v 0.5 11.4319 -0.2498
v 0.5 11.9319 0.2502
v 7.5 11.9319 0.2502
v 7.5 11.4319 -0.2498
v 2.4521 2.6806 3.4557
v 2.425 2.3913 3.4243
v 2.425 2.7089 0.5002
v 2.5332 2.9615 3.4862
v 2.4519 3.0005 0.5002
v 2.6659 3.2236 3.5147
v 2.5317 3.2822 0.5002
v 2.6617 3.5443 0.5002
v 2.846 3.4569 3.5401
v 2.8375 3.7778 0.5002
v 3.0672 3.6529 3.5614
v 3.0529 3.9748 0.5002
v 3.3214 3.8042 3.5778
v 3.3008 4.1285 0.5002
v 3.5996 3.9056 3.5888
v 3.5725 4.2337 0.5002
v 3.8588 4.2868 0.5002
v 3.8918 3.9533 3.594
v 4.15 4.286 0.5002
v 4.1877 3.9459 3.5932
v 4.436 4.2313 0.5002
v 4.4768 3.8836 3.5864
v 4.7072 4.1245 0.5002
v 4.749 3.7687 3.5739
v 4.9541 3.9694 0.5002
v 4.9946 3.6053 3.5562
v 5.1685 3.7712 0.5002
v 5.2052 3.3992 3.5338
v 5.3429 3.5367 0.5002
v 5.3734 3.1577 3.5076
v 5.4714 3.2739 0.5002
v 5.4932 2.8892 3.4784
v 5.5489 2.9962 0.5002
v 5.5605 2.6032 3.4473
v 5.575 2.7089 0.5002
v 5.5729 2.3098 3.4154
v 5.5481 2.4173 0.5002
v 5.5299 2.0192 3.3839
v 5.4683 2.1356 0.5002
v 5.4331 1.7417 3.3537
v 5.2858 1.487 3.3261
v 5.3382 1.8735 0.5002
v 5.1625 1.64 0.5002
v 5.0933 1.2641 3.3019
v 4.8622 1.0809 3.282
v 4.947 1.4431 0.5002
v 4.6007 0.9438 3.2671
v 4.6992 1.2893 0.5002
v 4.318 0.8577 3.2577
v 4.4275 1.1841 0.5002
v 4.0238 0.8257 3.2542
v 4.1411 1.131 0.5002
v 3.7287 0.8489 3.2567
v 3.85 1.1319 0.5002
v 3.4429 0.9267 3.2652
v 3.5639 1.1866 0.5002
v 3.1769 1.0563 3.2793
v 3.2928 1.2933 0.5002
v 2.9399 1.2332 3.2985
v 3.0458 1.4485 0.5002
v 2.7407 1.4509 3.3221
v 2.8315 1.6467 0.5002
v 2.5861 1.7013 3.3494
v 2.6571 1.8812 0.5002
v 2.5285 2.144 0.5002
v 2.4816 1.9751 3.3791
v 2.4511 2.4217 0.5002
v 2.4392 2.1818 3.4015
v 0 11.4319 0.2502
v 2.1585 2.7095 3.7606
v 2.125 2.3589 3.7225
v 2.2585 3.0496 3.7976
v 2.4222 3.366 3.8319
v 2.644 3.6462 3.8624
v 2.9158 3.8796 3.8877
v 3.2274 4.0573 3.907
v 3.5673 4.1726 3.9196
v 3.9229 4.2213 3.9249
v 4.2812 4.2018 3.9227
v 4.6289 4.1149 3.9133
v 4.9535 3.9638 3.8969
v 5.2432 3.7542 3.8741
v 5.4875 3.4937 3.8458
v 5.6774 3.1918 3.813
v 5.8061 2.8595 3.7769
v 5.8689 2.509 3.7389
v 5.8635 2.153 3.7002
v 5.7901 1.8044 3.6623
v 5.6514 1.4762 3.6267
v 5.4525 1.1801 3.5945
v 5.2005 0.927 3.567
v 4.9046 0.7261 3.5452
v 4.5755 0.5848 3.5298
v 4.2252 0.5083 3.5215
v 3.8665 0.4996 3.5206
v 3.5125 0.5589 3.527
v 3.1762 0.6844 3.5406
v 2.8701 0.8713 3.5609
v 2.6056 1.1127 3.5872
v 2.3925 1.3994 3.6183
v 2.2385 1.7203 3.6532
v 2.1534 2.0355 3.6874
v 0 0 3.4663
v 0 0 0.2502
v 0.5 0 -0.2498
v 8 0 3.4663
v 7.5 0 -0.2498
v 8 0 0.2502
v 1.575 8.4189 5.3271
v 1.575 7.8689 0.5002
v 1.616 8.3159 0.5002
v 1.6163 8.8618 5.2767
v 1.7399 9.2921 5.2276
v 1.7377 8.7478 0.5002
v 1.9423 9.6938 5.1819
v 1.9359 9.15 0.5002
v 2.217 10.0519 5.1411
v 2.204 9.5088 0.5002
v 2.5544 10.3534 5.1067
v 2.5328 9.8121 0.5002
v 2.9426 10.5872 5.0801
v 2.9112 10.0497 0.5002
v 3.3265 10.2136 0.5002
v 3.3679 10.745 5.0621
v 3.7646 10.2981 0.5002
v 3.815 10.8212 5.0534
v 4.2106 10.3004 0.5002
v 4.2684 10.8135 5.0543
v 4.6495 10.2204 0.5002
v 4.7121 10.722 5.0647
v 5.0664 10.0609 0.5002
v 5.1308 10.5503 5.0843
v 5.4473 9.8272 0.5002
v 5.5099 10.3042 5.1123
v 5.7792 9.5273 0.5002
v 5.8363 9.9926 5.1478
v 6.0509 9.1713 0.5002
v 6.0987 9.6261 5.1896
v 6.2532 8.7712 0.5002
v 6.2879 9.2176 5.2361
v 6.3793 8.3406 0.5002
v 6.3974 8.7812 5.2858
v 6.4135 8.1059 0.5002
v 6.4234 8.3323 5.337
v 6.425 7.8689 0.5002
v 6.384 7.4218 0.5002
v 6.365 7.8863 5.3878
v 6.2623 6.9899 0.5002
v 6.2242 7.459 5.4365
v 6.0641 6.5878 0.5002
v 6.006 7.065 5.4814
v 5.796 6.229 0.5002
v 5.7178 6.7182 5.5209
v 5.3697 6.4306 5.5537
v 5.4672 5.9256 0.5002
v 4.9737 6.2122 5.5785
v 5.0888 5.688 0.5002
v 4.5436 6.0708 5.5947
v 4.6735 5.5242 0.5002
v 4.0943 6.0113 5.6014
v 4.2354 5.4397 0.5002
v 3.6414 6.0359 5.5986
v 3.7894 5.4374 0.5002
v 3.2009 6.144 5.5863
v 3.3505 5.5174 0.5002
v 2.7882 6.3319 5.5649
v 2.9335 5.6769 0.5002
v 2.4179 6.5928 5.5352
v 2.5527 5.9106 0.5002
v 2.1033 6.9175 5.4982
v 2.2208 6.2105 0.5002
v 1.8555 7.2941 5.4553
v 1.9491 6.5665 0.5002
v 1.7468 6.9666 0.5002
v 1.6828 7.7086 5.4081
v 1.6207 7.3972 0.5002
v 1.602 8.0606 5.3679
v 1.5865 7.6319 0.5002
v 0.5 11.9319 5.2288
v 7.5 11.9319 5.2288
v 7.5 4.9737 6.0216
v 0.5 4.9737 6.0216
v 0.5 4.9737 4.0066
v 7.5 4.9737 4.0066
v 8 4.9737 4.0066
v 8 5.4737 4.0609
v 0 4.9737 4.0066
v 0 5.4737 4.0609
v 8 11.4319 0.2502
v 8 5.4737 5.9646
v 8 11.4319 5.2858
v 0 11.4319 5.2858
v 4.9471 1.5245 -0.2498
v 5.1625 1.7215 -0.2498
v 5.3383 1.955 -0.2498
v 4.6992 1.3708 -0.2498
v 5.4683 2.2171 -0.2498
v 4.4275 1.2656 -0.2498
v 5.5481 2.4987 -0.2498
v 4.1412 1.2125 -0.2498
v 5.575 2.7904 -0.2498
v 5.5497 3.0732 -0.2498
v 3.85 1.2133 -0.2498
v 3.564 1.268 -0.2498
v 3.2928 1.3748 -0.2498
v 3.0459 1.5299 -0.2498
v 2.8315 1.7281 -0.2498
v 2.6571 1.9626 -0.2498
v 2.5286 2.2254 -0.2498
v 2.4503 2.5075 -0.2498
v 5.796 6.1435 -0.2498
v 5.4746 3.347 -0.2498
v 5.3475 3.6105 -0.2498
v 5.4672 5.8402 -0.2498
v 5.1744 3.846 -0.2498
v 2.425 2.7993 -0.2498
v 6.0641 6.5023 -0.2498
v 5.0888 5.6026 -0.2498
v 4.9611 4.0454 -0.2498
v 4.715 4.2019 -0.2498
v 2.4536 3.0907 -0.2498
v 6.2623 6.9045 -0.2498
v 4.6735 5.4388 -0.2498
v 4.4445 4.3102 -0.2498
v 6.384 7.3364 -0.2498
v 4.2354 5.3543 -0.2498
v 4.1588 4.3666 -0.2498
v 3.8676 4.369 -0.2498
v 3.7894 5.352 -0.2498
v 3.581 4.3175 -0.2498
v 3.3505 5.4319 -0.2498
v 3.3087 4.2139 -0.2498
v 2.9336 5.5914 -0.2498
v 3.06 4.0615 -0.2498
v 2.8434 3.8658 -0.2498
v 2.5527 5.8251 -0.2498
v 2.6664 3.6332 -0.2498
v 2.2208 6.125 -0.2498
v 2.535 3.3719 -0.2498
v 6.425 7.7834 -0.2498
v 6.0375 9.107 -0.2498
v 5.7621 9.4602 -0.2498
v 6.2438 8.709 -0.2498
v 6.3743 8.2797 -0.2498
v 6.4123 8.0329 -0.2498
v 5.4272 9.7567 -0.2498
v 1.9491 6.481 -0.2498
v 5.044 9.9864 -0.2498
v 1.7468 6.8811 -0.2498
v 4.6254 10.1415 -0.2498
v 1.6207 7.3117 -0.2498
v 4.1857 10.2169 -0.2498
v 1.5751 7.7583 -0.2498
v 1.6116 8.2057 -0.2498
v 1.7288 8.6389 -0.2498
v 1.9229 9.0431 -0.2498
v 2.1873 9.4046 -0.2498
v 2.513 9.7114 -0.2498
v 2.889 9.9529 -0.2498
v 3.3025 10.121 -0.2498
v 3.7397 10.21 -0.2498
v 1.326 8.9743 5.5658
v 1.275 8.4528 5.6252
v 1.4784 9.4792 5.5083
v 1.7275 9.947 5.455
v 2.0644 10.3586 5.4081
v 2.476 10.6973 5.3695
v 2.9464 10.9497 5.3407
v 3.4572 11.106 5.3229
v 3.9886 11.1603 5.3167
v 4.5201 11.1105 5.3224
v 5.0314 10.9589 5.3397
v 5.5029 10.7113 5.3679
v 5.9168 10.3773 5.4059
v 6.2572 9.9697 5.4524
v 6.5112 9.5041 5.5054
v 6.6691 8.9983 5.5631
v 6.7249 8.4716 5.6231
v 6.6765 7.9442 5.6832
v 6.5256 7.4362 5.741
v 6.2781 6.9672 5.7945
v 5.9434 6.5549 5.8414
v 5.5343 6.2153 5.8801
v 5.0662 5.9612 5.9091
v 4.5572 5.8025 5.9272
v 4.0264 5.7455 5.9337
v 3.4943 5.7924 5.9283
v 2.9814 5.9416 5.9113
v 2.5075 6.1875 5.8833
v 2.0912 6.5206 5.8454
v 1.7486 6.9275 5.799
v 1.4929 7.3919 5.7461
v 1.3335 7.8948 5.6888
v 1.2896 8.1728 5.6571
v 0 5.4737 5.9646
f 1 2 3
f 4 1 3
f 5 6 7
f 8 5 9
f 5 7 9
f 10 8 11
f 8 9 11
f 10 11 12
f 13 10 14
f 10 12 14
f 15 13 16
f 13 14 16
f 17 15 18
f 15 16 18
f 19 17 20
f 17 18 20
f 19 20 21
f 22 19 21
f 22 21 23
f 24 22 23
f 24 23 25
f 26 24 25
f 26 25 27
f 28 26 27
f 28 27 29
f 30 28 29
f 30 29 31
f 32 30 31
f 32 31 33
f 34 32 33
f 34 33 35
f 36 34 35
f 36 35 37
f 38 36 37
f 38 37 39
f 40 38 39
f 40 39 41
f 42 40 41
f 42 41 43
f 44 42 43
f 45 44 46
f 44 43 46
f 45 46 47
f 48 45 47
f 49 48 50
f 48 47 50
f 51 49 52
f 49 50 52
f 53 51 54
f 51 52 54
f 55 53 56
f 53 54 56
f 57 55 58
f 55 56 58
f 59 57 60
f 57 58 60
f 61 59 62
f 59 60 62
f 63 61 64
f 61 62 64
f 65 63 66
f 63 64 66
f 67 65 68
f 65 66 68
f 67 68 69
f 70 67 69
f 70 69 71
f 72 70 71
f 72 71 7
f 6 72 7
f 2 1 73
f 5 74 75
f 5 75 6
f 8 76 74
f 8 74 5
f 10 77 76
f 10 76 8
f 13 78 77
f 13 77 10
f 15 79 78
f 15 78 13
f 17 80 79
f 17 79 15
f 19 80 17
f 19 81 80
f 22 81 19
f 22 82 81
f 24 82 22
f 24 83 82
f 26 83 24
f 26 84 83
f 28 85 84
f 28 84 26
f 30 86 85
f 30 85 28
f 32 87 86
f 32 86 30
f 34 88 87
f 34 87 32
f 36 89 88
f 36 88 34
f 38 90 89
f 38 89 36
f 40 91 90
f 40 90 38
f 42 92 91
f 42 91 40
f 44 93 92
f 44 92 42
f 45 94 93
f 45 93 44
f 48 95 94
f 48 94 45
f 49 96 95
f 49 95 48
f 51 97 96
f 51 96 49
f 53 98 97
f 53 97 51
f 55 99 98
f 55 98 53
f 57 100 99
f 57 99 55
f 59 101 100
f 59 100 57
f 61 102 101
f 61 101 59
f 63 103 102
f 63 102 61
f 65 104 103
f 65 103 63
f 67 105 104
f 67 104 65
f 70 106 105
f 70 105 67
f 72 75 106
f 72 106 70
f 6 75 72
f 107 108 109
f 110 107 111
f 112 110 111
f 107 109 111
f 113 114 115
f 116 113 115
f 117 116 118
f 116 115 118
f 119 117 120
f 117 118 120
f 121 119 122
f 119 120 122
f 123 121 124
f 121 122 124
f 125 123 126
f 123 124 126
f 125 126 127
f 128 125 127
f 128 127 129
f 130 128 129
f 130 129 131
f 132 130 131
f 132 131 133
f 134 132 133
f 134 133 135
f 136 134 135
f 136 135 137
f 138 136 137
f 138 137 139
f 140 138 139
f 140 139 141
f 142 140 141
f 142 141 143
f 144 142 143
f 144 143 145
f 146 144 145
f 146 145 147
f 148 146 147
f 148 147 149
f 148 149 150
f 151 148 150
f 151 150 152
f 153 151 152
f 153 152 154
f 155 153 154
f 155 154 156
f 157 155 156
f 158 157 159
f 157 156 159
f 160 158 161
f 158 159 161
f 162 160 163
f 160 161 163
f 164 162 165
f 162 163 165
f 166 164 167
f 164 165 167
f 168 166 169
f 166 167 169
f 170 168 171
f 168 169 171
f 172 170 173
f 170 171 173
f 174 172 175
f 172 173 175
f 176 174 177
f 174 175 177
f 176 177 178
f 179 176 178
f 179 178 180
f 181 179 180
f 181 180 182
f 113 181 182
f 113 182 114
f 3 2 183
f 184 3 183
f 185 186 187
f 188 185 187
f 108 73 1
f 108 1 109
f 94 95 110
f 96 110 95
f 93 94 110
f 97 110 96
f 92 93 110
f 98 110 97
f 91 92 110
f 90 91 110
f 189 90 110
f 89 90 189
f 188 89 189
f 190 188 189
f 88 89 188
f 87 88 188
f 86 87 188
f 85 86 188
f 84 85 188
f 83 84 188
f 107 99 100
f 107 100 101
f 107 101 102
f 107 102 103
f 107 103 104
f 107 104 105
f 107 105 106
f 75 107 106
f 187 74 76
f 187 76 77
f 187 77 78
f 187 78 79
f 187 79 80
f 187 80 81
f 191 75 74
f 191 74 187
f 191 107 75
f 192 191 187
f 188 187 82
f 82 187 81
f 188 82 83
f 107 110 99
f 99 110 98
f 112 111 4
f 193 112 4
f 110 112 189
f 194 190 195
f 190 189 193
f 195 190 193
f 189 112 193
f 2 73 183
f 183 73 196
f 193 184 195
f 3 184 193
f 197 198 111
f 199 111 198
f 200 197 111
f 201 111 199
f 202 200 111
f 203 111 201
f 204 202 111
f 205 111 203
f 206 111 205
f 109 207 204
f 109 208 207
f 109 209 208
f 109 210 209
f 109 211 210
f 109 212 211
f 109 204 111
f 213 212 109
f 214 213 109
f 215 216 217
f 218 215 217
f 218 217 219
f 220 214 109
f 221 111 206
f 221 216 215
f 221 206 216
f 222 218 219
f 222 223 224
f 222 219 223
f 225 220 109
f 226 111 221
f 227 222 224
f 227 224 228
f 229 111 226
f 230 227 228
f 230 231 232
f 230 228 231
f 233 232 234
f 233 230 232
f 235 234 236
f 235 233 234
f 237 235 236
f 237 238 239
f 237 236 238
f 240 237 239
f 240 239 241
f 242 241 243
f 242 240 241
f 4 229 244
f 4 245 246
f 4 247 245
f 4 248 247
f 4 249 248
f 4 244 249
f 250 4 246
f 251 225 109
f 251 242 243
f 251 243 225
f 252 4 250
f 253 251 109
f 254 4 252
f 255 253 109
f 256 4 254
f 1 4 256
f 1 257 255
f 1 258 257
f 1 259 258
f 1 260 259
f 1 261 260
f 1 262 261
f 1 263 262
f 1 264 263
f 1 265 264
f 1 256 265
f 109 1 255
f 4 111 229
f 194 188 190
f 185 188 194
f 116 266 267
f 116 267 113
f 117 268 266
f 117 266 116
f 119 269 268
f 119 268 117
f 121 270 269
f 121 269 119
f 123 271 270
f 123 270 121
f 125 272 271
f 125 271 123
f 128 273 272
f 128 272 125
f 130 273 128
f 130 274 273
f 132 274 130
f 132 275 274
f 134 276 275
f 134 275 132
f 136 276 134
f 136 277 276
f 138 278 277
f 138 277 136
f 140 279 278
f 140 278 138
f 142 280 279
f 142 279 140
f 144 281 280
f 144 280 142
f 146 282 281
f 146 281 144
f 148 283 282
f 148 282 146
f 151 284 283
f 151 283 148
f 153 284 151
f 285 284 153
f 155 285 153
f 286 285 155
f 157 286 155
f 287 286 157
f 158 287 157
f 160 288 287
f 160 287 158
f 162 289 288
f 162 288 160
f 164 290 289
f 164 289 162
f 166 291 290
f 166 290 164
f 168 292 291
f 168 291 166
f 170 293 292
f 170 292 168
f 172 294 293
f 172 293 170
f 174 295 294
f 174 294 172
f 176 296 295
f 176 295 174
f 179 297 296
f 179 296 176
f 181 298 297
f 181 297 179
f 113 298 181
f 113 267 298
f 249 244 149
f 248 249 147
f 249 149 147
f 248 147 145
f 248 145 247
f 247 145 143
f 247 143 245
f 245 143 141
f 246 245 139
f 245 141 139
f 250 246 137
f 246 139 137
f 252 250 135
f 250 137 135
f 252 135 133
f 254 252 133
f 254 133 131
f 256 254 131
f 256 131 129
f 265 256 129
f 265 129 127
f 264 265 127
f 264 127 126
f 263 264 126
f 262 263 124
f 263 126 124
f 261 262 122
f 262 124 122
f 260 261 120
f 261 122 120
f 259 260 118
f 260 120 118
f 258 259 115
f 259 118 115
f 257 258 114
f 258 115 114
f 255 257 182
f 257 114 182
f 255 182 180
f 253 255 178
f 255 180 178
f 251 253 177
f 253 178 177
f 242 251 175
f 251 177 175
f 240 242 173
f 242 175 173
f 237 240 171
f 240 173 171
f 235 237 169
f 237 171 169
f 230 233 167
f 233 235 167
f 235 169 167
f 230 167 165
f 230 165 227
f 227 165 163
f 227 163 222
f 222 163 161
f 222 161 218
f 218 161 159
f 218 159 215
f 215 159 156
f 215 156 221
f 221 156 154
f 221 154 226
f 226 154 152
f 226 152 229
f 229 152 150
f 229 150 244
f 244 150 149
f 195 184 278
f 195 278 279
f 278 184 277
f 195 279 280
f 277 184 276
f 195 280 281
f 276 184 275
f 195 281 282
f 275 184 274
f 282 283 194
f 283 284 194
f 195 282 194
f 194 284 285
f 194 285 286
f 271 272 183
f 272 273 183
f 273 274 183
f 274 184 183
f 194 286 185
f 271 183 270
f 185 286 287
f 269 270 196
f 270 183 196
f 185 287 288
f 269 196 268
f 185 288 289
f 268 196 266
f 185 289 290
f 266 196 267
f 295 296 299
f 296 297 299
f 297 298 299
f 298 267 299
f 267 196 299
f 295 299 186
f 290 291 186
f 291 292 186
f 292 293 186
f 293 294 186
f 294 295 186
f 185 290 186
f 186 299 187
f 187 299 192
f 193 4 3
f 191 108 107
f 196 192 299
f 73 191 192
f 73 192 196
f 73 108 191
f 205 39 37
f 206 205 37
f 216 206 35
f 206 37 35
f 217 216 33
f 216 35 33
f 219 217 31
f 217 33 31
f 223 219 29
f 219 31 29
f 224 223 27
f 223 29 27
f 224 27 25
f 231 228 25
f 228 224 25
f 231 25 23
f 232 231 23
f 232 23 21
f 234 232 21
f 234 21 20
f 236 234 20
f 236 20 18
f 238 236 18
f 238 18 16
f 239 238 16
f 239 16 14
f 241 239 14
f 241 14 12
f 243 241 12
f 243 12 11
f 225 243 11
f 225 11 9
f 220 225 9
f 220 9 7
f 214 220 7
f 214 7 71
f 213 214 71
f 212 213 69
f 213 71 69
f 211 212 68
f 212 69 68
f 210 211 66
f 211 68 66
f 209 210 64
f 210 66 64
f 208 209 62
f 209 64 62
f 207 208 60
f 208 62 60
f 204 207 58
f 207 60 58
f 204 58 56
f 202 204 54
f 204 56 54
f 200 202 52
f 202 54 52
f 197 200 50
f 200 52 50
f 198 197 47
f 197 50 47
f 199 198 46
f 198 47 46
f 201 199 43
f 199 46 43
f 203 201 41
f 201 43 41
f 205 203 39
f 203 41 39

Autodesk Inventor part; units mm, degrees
ref_plane "YZ Plane" through (0, 0, 0) normal (1, 0, 0) x (0, 1, 0)
ref_plane "XZ Plane" through (0, 0, 0) normal (0, 1, 0) x (-1, 0, 0)
ref_plane "XY Plane" through (0, 0, 0) normal (0, 0, 1) x (1, 0, 0)
sketch "Skizze5" plane through (0, 0, 0) normal (1, 0, 0) x (0, 1, 0)
  line L0 (0, 0) -> (0.5, 0)
  line L1 (0.5, 0) -> (4.9737, 0.486)
  line L2 (4.9737, 0.486) -> (11.4319, -0.2498)
  line L3 (11.4319, -0.2498) -> (11.9319, -0.2498)
  line L4 (11.9319, -0.2498) -> (11.9319, 5.2288)
  line L5 (11.9319, 5.2288) -> (4.9737, 6.0216)
  line L6 (0, 3.4663) -> (0, 0)
  line L7 (0, 3.4663) -> (4.9737, 4.0066)
  line L8 (4.9737, 8.0188) -> (4.9737, 2.9641) construction
  line L9 (4.9737, 6.0216) -> (4.9737, 4.0066)
  point P0 (0, 0)
  dimension "d21" = 0.5
  dimension "d22" = 6.2
  dimension "d23" = 6.5
  dimension "d24" = 4.5
  dimension "d25" = 6.5
  dimension "d26" = 5.5
  dimension "d27" = 3.5
extrude "Extrusion3" add sketch "Skizze5" along normal blind 8
sketch "Skizze6" plane through (8, 11.4319, -0.2498) normal (0, -0.1132032, -0.9935719) x (-1, 0, 0)
  circle A0 centre (4, -3.625) radius 2.425
  line L0 (4, 1.7492) -> (4, -8.8787)
  line L1 (-1.2914, -3.625) -> (9.5036, -3.625)
  line L2 (8, -0.1234) -> (8, -7.1266) projected
  line L3 (8, 0.4968) -> (0, 0.4968) projected
  point P0 (8, -11.3867)
  point P1 (8, -3.625)
  point P2 (4, 0.4968)
  dimension "d30" = 4.85
extrude "Extrusion4" cut sketch "Skizze6" against normal through all
sketch "Skizze7" plane through (8, 4.9737, 0.486) normal (0, 0.1079994, -0.994151) x (-1, 0, 0)
  line L0 (-0.408, -2.25) -> (9.5226, -2.25)
  line L1 (4, -0.248) -> (4, -7.2475)
  line L2 (8, -4.9971) -> (0, -4.9971) projected
  line L3 (8, -4.5) -> (8, 0) projected
  circle A0 centre (4, -2.25) radius 1.575
  point P0 (4, -4.9971)
  point P1 (8, -2.25)
  dimension "d33" = 3.15
extrude "Extrusion5" cut sketch "Skizze7" against normal through all
sketch "Skizze8" plane through (0, 11.4319, -0.2498) normal (0, 0, -1) x (-1, 0, 0)
  line L0 (-8, -6.4582) -> (-8, 0) projected
  line L1 (-8, -10.9319) -> (-8, -6.4582) projected
  line L2 (-8, -11.4319) -> (-8, -10.9319) projected
  line L3 (0, -11.4319) -> (-8, -11.4319) projected
  line L4 (0, -11.4319) -> (0, -10.9319) projected
  line L5 (0, -10.9319) -> (0, -6.4582) projected
  line L6 (0, -6.4582) -> (0, 0) projected
  line L7 (0, 0) -> (0, 0.5) projected
  line L8 (0, 0.5) -> (-8, 0.5) projected
  line L9 (-8, 0) -> (-8, 0.5) projected
extrude "Extrusion6" add sketch "Skizze8" against normal blind 0.75
sketch "Skizze9" plane through (0, 4.9737, 6.0216) normal (0, 0.1132032, 0.9935719) x (1, 0, 0)
  circle A0 centre (4, 3.5016) radius 2.425 projected
  point P0 (0, -4.26)
extrude "Extrusion7" cut sketch "Skizze9" against normal through all
sketch "Skizze10" plane through (0, 0, 3.4663) normal (0, -0.1079994, 0.994151) x (1, 0, 0)
  circle A0 centre (4, 2.3727) radius 1.575 projected
  point P0 (0, -0.3744)
extrude "Extrusion8" cut sketch "Skizze10" against normal through all
chamfer "Fase2" distance 0.5 angle 45 7 edges at (8, 5.9659, -0.2498) (4, 11.9319, -0.2498) (8, 11.9319, 2.4895) (0, 5.9659, -0.2498) (0, 11.9319, 2.4895) (8, 4.9737, 5.0141) (0, 4.9737, 5.0141)
chamfer "Fase3" distance 0.3 angle 45 2 edges at (6.425, 8.4528, 5.6252) (5.575, 2.3588, 3.7225)
properties part number "led_holder_v12"
